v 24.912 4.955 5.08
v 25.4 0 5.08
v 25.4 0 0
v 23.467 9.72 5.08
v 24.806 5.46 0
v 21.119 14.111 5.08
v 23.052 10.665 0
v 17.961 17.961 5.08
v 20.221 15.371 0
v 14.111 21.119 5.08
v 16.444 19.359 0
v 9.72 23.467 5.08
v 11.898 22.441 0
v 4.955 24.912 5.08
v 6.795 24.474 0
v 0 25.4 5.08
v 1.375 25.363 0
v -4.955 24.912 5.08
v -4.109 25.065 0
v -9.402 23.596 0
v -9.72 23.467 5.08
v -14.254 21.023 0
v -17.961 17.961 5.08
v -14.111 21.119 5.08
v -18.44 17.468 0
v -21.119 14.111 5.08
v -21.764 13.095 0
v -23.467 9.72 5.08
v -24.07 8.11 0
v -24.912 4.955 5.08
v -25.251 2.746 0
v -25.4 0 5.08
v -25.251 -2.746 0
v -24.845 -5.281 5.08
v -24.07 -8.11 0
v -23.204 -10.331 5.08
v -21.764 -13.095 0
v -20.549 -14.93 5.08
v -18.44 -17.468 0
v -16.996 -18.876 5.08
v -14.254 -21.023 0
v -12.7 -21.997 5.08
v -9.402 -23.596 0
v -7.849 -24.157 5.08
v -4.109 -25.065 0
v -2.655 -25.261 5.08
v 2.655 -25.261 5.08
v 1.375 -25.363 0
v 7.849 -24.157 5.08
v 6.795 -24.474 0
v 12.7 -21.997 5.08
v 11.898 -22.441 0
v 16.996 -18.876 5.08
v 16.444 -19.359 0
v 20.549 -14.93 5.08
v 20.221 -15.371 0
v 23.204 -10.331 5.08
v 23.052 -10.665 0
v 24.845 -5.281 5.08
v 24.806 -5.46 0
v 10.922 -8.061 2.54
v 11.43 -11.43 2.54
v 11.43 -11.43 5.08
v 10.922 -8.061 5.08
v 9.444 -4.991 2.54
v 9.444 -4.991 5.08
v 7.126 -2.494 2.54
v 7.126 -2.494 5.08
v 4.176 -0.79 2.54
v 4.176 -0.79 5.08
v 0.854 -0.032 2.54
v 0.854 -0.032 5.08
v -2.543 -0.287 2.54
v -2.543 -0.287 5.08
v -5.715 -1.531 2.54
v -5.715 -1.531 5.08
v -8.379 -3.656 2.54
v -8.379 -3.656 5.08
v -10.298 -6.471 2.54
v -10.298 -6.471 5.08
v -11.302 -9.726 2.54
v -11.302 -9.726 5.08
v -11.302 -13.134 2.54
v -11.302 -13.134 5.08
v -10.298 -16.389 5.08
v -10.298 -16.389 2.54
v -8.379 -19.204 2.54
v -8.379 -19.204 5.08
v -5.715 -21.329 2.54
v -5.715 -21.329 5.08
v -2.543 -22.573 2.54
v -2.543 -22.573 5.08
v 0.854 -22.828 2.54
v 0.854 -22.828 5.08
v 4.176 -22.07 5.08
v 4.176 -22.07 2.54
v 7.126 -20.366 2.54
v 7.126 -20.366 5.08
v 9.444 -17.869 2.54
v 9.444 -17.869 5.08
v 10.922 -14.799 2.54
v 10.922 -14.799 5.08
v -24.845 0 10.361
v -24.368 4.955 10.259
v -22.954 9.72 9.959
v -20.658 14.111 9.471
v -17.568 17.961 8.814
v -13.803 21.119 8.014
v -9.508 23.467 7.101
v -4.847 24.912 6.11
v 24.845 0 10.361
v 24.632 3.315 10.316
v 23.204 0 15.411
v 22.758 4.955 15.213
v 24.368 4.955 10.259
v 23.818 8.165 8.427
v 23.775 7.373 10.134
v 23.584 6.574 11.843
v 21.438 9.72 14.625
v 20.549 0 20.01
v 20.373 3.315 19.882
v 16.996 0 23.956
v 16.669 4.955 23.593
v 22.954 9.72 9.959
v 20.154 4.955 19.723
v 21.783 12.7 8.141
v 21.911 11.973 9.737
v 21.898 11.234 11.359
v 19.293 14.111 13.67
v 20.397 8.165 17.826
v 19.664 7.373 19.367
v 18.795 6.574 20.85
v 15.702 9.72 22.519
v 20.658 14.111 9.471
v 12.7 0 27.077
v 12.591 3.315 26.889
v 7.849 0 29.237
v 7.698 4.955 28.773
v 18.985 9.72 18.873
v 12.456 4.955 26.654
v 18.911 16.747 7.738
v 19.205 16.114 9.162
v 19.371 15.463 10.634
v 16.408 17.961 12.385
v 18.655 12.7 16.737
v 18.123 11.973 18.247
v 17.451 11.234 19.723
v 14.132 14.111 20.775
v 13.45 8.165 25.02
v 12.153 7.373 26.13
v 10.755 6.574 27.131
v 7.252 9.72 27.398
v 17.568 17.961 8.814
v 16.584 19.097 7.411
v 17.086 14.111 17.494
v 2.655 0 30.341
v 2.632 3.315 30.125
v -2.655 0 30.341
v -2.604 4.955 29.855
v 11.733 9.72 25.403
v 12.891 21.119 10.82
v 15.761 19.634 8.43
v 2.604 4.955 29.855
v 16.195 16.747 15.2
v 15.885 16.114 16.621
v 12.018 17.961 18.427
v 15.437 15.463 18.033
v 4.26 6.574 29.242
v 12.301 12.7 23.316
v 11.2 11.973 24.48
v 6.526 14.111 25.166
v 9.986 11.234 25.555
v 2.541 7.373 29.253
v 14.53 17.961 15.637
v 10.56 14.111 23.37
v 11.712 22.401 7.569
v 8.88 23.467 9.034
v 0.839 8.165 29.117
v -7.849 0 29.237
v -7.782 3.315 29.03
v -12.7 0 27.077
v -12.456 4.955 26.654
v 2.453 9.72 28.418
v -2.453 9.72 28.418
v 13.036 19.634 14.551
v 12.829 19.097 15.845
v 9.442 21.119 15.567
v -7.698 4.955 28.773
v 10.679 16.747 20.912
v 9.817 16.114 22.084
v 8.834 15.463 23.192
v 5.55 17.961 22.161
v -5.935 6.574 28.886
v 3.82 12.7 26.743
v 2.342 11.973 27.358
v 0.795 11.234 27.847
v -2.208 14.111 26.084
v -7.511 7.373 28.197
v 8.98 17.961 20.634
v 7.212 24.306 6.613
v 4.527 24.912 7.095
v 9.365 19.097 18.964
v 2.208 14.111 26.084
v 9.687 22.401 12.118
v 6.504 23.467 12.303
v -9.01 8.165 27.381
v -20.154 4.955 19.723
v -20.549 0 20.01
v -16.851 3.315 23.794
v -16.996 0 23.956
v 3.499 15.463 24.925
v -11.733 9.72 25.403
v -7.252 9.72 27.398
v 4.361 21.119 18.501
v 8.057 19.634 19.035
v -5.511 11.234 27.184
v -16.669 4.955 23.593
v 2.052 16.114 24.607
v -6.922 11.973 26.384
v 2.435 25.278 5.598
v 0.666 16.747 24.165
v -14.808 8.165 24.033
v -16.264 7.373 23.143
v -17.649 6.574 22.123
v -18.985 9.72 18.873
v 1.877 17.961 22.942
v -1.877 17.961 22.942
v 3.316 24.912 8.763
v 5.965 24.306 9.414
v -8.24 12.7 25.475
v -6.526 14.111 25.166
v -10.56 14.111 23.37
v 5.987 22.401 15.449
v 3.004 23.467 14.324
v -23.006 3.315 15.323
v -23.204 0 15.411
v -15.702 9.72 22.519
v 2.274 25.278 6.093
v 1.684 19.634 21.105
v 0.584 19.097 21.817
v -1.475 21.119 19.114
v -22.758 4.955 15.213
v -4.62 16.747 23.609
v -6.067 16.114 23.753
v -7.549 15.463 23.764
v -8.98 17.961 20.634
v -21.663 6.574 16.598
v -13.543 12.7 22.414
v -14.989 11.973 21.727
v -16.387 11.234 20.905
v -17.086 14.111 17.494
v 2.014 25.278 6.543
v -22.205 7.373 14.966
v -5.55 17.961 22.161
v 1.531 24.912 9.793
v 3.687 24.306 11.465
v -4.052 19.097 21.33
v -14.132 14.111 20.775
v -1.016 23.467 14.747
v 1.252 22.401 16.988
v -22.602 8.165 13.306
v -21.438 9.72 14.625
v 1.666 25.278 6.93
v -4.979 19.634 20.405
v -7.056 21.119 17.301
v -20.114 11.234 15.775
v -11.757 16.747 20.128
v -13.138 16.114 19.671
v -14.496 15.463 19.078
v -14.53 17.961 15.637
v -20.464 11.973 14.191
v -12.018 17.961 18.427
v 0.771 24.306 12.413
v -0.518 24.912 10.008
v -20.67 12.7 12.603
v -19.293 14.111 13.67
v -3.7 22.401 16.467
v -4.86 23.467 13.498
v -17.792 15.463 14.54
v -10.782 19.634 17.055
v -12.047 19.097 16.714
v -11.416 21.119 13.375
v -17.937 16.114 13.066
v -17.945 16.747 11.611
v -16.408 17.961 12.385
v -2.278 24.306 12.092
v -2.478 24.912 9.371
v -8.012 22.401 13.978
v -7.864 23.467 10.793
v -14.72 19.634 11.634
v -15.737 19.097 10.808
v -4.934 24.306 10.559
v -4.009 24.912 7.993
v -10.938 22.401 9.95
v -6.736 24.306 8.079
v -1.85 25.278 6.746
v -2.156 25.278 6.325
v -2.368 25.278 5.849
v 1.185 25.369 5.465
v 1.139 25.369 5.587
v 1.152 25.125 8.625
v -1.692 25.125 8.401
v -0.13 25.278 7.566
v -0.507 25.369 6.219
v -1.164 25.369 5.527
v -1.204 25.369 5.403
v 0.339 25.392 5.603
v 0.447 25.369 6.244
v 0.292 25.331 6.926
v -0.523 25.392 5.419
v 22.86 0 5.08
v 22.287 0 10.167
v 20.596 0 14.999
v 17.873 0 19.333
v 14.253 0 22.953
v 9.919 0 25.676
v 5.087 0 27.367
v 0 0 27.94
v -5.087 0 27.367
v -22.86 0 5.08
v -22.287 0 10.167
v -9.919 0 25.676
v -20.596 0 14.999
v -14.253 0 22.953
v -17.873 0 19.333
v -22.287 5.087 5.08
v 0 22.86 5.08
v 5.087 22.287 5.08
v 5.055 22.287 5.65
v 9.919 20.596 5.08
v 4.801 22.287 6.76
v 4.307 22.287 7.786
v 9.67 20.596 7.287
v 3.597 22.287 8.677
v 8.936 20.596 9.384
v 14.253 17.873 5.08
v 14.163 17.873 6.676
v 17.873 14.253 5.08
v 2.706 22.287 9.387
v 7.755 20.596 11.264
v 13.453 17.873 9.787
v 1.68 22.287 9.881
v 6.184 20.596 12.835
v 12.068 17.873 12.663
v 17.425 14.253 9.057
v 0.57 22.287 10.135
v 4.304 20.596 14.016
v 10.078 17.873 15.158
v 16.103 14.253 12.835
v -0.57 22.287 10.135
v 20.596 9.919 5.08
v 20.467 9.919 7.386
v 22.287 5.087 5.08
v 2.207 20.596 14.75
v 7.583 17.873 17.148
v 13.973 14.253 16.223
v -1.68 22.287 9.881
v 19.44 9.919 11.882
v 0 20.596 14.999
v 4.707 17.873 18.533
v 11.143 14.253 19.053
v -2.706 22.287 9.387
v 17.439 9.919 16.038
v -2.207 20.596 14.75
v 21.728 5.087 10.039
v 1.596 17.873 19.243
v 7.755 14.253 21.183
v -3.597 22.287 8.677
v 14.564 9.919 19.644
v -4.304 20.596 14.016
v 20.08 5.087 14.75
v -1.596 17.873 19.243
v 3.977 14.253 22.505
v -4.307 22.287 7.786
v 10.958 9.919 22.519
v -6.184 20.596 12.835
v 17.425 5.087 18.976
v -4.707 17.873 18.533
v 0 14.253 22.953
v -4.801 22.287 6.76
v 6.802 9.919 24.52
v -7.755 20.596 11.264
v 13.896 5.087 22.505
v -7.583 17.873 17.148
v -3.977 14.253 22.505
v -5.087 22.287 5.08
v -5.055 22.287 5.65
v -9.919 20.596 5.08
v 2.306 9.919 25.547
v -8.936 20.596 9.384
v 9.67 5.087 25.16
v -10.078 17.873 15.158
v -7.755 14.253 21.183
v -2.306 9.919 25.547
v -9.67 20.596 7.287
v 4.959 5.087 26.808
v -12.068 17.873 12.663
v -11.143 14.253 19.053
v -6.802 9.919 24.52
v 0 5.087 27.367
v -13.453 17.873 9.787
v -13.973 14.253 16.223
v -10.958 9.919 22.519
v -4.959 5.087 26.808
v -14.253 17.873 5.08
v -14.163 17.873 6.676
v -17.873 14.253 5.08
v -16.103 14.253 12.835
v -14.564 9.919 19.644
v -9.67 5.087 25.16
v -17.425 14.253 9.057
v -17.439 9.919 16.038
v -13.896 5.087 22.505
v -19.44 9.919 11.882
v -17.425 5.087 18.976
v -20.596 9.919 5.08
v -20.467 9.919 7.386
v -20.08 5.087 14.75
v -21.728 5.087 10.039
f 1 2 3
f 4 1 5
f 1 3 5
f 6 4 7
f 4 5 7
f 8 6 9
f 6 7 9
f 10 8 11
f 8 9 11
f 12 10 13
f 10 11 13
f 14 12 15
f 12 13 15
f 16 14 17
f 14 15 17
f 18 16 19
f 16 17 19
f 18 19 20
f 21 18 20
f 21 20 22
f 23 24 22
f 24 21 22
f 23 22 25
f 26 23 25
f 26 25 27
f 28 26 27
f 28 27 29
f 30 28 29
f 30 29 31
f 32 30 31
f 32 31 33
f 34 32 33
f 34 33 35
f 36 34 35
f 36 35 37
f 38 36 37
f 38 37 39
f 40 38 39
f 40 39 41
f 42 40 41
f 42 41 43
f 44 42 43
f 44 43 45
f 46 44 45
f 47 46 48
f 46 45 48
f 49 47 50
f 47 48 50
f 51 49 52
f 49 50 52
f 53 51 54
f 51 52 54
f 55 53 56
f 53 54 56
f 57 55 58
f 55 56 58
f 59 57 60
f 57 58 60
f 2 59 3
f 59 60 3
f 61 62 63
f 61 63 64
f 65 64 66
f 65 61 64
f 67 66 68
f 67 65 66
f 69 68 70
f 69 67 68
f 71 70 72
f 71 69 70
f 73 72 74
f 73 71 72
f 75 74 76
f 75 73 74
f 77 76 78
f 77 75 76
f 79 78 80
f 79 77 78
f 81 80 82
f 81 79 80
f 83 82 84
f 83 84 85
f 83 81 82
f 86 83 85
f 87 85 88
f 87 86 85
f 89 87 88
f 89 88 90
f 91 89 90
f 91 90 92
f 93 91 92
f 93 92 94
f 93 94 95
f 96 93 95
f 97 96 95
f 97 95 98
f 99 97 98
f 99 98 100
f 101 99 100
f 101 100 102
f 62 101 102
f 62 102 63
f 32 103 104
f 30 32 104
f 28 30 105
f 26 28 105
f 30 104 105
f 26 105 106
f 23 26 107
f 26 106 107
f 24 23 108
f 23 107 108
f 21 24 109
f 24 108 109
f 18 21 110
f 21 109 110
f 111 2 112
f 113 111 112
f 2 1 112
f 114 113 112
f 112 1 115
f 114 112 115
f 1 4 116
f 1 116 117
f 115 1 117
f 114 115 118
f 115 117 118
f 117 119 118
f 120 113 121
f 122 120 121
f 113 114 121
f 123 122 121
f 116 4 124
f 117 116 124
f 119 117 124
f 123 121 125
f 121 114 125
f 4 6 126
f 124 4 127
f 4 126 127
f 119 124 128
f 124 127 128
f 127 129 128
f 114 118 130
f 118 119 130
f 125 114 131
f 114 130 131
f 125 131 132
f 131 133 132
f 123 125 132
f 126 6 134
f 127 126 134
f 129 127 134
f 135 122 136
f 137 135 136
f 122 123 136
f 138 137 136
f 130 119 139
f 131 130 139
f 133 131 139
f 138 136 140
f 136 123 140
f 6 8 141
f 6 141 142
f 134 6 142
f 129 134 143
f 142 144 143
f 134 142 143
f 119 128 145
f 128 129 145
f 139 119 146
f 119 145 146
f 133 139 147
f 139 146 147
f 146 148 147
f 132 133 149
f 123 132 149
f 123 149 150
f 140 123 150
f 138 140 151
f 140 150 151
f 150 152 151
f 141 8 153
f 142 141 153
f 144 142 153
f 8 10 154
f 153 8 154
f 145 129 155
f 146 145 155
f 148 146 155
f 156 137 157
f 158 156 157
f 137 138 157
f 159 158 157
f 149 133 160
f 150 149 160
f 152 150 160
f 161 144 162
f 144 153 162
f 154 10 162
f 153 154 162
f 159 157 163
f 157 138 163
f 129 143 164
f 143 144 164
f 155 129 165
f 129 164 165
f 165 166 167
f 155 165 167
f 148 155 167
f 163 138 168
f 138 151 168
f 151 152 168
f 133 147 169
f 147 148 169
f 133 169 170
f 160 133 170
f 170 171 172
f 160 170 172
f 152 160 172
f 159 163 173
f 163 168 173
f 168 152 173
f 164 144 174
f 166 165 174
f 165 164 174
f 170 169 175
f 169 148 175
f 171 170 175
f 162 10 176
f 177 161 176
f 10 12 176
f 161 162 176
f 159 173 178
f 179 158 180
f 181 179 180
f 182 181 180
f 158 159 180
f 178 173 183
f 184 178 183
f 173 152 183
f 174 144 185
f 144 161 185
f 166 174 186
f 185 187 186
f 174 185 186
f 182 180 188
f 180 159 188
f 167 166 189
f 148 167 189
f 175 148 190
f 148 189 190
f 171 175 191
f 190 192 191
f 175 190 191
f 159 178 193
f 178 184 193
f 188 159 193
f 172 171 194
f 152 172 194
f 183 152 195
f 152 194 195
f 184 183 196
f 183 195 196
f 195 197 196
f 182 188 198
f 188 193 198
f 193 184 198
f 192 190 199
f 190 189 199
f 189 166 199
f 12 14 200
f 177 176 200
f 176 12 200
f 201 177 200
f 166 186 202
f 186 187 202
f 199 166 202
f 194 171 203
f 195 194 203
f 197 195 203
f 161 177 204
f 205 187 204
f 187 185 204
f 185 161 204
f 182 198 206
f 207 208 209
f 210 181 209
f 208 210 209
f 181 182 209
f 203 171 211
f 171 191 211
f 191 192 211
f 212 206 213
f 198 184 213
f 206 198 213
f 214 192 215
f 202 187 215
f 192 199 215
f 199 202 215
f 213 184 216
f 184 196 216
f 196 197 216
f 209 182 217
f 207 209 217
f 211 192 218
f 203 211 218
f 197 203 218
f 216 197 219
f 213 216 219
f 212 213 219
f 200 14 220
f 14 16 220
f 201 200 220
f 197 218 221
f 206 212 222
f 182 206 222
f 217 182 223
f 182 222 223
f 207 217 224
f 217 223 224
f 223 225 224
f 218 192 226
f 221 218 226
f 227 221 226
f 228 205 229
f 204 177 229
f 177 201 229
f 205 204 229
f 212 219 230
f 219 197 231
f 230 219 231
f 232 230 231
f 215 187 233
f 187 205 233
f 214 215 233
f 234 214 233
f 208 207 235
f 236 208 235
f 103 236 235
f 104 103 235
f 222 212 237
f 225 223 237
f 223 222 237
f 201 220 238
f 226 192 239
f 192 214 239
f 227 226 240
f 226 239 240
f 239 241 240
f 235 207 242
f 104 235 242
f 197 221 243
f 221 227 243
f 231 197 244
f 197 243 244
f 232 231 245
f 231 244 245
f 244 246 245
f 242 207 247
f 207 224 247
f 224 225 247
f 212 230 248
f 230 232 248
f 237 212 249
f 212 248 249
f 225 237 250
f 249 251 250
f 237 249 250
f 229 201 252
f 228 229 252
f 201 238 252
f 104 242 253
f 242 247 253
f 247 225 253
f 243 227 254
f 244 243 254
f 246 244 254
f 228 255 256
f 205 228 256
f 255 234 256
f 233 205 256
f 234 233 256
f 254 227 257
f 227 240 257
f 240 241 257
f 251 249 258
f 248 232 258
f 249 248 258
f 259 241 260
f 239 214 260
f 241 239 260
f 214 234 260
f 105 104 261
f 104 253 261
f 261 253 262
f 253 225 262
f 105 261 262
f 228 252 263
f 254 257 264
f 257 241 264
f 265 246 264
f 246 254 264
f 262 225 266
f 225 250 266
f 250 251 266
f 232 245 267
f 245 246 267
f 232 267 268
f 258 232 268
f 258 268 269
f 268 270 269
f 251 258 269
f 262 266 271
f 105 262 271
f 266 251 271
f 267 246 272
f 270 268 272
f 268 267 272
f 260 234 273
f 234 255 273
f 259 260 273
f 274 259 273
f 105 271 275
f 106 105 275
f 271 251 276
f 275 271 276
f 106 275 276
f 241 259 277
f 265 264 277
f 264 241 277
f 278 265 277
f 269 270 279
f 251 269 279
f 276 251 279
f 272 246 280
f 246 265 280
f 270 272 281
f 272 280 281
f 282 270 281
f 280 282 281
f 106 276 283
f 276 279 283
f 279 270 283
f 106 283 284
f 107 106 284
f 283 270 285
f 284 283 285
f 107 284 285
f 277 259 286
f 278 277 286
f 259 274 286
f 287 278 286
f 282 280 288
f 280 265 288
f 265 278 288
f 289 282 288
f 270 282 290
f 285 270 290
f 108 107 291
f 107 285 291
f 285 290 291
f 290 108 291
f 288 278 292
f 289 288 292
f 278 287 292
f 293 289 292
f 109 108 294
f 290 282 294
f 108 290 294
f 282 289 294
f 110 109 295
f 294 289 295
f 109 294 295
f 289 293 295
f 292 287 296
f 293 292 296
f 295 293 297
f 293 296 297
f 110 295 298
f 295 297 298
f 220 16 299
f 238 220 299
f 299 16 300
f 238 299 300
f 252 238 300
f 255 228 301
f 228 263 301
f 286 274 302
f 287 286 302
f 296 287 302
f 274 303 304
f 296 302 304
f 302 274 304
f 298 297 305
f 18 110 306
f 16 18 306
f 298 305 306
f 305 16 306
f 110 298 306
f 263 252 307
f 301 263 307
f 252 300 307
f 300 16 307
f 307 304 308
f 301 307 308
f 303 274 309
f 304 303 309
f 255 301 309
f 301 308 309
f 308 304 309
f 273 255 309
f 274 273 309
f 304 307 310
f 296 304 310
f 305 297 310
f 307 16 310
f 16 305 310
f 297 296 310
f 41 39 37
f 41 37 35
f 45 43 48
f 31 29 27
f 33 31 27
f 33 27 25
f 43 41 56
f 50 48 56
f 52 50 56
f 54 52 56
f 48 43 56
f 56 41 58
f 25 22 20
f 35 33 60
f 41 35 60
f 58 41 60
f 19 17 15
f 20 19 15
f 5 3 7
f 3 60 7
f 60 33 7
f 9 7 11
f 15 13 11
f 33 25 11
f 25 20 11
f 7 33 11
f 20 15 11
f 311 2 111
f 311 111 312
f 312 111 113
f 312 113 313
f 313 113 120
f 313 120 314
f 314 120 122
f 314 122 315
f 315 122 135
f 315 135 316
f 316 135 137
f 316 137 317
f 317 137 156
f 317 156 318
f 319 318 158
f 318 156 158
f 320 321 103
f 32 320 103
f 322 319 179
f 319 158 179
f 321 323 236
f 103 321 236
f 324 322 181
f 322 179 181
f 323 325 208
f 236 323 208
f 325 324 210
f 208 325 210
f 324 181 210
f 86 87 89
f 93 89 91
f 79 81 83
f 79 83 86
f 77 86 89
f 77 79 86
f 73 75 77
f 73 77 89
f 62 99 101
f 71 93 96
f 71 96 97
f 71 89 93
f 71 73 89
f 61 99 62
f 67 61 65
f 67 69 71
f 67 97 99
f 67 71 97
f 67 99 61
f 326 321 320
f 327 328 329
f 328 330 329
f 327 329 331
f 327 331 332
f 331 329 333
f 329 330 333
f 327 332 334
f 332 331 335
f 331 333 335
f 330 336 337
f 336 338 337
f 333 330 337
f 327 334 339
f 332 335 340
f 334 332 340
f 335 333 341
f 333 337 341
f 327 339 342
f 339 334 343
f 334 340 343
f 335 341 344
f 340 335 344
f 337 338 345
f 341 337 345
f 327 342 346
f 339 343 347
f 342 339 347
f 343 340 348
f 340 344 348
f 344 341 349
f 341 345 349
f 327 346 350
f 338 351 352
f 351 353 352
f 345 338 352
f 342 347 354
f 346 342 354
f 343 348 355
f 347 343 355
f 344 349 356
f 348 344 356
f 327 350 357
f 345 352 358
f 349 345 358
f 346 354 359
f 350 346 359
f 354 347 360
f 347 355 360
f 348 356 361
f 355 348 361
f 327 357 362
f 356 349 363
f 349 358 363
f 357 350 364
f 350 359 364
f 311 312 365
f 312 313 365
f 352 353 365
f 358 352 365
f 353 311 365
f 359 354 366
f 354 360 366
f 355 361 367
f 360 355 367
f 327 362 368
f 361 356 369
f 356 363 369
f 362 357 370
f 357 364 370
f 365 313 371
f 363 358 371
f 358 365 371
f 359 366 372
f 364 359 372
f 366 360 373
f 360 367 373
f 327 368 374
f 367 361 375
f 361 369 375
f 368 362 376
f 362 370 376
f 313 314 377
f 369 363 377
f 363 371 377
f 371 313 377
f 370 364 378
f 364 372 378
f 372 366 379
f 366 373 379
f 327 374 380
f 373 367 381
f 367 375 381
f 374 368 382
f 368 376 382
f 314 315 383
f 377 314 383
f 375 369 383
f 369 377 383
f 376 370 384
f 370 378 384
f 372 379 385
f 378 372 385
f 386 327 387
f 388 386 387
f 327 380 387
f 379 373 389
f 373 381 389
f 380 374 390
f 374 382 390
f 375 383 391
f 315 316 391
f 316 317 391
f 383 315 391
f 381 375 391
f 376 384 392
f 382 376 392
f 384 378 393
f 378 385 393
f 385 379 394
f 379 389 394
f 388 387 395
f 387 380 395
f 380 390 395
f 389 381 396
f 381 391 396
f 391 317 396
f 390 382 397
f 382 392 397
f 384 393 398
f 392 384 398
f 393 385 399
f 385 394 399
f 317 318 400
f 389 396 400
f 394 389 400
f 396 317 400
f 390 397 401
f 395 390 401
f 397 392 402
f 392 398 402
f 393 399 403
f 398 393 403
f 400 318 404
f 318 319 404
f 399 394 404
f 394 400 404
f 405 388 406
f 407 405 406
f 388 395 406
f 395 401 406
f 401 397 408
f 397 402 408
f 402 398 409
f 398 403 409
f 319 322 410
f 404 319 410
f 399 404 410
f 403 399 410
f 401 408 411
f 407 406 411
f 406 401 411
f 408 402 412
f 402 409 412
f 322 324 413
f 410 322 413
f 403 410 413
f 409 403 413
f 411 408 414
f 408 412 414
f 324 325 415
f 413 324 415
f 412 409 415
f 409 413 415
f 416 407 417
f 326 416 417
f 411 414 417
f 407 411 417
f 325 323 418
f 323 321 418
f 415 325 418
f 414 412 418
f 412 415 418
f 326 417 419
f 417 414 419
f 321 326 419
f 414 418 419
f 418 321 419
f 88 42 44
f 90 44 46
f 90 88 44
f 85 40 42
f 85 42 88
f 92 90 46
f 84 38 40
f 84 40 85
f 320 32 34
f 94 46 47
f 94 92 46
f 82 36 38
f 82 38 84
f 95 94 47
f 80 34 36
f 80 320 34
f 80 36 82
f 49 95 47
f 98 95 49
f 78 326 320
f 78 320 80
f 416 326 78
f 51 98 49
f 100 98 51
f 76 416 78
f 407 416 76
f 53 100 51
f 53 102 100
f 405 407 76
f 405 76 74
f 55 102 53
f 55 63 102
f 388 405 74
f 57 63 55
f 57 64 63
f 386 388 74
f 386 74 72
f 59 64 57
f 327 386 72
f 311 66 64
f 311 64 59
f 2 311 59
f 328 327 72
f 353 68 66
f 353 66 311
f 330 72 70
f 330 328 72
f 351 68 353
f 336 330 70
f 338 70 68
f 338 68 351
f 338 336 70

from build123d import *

# Parameters (mm, degrees)
F0_R     = 25.4
F0_R_2   = 11.43
F1_DEPTH = 5.08
F2_DEPTH = 2.54
F4_ANGLE = 180


with BuildPart() as f1:
    # F0 (on Top) → F1 (new body)
    with BuildSketch(Plane.XY):
        Circle(F0_R)
        with Locations((0, -11.43)):
            Circle(F0_R_2, mode=Mode.SUBTRACT)
    extrude(amount=F1_DEPTH)

    # F0 (on Top) → F2 (join)
    with BuildSketch(Plane.XY):
        with Locations((0, -11.43)):
            Circle(F0_R_2)
    extrude(amount=F2_DEPTH)

    # F3 (on face) → F4 (revolve)
    with BuildSketch(Plane.XY.offset(5.08)):
        with BuildLine():
            Line((22.86, 0), (25.4, 0))
            ThreePointArc((25.4, 0), (17.960512, 17.960512), (0, 25.4))
            Line((0, 25.4), (0, 22.86))
            ThreePointArc((0, 22.86), (16.164461, 16.164461), (22.86, 0))
        make_face()
    revolve(axis=Axis((0, 24.13, 5.08), (0, -1, 0)), revolution_arc=F4_ANGLE)


solid = f1.part
